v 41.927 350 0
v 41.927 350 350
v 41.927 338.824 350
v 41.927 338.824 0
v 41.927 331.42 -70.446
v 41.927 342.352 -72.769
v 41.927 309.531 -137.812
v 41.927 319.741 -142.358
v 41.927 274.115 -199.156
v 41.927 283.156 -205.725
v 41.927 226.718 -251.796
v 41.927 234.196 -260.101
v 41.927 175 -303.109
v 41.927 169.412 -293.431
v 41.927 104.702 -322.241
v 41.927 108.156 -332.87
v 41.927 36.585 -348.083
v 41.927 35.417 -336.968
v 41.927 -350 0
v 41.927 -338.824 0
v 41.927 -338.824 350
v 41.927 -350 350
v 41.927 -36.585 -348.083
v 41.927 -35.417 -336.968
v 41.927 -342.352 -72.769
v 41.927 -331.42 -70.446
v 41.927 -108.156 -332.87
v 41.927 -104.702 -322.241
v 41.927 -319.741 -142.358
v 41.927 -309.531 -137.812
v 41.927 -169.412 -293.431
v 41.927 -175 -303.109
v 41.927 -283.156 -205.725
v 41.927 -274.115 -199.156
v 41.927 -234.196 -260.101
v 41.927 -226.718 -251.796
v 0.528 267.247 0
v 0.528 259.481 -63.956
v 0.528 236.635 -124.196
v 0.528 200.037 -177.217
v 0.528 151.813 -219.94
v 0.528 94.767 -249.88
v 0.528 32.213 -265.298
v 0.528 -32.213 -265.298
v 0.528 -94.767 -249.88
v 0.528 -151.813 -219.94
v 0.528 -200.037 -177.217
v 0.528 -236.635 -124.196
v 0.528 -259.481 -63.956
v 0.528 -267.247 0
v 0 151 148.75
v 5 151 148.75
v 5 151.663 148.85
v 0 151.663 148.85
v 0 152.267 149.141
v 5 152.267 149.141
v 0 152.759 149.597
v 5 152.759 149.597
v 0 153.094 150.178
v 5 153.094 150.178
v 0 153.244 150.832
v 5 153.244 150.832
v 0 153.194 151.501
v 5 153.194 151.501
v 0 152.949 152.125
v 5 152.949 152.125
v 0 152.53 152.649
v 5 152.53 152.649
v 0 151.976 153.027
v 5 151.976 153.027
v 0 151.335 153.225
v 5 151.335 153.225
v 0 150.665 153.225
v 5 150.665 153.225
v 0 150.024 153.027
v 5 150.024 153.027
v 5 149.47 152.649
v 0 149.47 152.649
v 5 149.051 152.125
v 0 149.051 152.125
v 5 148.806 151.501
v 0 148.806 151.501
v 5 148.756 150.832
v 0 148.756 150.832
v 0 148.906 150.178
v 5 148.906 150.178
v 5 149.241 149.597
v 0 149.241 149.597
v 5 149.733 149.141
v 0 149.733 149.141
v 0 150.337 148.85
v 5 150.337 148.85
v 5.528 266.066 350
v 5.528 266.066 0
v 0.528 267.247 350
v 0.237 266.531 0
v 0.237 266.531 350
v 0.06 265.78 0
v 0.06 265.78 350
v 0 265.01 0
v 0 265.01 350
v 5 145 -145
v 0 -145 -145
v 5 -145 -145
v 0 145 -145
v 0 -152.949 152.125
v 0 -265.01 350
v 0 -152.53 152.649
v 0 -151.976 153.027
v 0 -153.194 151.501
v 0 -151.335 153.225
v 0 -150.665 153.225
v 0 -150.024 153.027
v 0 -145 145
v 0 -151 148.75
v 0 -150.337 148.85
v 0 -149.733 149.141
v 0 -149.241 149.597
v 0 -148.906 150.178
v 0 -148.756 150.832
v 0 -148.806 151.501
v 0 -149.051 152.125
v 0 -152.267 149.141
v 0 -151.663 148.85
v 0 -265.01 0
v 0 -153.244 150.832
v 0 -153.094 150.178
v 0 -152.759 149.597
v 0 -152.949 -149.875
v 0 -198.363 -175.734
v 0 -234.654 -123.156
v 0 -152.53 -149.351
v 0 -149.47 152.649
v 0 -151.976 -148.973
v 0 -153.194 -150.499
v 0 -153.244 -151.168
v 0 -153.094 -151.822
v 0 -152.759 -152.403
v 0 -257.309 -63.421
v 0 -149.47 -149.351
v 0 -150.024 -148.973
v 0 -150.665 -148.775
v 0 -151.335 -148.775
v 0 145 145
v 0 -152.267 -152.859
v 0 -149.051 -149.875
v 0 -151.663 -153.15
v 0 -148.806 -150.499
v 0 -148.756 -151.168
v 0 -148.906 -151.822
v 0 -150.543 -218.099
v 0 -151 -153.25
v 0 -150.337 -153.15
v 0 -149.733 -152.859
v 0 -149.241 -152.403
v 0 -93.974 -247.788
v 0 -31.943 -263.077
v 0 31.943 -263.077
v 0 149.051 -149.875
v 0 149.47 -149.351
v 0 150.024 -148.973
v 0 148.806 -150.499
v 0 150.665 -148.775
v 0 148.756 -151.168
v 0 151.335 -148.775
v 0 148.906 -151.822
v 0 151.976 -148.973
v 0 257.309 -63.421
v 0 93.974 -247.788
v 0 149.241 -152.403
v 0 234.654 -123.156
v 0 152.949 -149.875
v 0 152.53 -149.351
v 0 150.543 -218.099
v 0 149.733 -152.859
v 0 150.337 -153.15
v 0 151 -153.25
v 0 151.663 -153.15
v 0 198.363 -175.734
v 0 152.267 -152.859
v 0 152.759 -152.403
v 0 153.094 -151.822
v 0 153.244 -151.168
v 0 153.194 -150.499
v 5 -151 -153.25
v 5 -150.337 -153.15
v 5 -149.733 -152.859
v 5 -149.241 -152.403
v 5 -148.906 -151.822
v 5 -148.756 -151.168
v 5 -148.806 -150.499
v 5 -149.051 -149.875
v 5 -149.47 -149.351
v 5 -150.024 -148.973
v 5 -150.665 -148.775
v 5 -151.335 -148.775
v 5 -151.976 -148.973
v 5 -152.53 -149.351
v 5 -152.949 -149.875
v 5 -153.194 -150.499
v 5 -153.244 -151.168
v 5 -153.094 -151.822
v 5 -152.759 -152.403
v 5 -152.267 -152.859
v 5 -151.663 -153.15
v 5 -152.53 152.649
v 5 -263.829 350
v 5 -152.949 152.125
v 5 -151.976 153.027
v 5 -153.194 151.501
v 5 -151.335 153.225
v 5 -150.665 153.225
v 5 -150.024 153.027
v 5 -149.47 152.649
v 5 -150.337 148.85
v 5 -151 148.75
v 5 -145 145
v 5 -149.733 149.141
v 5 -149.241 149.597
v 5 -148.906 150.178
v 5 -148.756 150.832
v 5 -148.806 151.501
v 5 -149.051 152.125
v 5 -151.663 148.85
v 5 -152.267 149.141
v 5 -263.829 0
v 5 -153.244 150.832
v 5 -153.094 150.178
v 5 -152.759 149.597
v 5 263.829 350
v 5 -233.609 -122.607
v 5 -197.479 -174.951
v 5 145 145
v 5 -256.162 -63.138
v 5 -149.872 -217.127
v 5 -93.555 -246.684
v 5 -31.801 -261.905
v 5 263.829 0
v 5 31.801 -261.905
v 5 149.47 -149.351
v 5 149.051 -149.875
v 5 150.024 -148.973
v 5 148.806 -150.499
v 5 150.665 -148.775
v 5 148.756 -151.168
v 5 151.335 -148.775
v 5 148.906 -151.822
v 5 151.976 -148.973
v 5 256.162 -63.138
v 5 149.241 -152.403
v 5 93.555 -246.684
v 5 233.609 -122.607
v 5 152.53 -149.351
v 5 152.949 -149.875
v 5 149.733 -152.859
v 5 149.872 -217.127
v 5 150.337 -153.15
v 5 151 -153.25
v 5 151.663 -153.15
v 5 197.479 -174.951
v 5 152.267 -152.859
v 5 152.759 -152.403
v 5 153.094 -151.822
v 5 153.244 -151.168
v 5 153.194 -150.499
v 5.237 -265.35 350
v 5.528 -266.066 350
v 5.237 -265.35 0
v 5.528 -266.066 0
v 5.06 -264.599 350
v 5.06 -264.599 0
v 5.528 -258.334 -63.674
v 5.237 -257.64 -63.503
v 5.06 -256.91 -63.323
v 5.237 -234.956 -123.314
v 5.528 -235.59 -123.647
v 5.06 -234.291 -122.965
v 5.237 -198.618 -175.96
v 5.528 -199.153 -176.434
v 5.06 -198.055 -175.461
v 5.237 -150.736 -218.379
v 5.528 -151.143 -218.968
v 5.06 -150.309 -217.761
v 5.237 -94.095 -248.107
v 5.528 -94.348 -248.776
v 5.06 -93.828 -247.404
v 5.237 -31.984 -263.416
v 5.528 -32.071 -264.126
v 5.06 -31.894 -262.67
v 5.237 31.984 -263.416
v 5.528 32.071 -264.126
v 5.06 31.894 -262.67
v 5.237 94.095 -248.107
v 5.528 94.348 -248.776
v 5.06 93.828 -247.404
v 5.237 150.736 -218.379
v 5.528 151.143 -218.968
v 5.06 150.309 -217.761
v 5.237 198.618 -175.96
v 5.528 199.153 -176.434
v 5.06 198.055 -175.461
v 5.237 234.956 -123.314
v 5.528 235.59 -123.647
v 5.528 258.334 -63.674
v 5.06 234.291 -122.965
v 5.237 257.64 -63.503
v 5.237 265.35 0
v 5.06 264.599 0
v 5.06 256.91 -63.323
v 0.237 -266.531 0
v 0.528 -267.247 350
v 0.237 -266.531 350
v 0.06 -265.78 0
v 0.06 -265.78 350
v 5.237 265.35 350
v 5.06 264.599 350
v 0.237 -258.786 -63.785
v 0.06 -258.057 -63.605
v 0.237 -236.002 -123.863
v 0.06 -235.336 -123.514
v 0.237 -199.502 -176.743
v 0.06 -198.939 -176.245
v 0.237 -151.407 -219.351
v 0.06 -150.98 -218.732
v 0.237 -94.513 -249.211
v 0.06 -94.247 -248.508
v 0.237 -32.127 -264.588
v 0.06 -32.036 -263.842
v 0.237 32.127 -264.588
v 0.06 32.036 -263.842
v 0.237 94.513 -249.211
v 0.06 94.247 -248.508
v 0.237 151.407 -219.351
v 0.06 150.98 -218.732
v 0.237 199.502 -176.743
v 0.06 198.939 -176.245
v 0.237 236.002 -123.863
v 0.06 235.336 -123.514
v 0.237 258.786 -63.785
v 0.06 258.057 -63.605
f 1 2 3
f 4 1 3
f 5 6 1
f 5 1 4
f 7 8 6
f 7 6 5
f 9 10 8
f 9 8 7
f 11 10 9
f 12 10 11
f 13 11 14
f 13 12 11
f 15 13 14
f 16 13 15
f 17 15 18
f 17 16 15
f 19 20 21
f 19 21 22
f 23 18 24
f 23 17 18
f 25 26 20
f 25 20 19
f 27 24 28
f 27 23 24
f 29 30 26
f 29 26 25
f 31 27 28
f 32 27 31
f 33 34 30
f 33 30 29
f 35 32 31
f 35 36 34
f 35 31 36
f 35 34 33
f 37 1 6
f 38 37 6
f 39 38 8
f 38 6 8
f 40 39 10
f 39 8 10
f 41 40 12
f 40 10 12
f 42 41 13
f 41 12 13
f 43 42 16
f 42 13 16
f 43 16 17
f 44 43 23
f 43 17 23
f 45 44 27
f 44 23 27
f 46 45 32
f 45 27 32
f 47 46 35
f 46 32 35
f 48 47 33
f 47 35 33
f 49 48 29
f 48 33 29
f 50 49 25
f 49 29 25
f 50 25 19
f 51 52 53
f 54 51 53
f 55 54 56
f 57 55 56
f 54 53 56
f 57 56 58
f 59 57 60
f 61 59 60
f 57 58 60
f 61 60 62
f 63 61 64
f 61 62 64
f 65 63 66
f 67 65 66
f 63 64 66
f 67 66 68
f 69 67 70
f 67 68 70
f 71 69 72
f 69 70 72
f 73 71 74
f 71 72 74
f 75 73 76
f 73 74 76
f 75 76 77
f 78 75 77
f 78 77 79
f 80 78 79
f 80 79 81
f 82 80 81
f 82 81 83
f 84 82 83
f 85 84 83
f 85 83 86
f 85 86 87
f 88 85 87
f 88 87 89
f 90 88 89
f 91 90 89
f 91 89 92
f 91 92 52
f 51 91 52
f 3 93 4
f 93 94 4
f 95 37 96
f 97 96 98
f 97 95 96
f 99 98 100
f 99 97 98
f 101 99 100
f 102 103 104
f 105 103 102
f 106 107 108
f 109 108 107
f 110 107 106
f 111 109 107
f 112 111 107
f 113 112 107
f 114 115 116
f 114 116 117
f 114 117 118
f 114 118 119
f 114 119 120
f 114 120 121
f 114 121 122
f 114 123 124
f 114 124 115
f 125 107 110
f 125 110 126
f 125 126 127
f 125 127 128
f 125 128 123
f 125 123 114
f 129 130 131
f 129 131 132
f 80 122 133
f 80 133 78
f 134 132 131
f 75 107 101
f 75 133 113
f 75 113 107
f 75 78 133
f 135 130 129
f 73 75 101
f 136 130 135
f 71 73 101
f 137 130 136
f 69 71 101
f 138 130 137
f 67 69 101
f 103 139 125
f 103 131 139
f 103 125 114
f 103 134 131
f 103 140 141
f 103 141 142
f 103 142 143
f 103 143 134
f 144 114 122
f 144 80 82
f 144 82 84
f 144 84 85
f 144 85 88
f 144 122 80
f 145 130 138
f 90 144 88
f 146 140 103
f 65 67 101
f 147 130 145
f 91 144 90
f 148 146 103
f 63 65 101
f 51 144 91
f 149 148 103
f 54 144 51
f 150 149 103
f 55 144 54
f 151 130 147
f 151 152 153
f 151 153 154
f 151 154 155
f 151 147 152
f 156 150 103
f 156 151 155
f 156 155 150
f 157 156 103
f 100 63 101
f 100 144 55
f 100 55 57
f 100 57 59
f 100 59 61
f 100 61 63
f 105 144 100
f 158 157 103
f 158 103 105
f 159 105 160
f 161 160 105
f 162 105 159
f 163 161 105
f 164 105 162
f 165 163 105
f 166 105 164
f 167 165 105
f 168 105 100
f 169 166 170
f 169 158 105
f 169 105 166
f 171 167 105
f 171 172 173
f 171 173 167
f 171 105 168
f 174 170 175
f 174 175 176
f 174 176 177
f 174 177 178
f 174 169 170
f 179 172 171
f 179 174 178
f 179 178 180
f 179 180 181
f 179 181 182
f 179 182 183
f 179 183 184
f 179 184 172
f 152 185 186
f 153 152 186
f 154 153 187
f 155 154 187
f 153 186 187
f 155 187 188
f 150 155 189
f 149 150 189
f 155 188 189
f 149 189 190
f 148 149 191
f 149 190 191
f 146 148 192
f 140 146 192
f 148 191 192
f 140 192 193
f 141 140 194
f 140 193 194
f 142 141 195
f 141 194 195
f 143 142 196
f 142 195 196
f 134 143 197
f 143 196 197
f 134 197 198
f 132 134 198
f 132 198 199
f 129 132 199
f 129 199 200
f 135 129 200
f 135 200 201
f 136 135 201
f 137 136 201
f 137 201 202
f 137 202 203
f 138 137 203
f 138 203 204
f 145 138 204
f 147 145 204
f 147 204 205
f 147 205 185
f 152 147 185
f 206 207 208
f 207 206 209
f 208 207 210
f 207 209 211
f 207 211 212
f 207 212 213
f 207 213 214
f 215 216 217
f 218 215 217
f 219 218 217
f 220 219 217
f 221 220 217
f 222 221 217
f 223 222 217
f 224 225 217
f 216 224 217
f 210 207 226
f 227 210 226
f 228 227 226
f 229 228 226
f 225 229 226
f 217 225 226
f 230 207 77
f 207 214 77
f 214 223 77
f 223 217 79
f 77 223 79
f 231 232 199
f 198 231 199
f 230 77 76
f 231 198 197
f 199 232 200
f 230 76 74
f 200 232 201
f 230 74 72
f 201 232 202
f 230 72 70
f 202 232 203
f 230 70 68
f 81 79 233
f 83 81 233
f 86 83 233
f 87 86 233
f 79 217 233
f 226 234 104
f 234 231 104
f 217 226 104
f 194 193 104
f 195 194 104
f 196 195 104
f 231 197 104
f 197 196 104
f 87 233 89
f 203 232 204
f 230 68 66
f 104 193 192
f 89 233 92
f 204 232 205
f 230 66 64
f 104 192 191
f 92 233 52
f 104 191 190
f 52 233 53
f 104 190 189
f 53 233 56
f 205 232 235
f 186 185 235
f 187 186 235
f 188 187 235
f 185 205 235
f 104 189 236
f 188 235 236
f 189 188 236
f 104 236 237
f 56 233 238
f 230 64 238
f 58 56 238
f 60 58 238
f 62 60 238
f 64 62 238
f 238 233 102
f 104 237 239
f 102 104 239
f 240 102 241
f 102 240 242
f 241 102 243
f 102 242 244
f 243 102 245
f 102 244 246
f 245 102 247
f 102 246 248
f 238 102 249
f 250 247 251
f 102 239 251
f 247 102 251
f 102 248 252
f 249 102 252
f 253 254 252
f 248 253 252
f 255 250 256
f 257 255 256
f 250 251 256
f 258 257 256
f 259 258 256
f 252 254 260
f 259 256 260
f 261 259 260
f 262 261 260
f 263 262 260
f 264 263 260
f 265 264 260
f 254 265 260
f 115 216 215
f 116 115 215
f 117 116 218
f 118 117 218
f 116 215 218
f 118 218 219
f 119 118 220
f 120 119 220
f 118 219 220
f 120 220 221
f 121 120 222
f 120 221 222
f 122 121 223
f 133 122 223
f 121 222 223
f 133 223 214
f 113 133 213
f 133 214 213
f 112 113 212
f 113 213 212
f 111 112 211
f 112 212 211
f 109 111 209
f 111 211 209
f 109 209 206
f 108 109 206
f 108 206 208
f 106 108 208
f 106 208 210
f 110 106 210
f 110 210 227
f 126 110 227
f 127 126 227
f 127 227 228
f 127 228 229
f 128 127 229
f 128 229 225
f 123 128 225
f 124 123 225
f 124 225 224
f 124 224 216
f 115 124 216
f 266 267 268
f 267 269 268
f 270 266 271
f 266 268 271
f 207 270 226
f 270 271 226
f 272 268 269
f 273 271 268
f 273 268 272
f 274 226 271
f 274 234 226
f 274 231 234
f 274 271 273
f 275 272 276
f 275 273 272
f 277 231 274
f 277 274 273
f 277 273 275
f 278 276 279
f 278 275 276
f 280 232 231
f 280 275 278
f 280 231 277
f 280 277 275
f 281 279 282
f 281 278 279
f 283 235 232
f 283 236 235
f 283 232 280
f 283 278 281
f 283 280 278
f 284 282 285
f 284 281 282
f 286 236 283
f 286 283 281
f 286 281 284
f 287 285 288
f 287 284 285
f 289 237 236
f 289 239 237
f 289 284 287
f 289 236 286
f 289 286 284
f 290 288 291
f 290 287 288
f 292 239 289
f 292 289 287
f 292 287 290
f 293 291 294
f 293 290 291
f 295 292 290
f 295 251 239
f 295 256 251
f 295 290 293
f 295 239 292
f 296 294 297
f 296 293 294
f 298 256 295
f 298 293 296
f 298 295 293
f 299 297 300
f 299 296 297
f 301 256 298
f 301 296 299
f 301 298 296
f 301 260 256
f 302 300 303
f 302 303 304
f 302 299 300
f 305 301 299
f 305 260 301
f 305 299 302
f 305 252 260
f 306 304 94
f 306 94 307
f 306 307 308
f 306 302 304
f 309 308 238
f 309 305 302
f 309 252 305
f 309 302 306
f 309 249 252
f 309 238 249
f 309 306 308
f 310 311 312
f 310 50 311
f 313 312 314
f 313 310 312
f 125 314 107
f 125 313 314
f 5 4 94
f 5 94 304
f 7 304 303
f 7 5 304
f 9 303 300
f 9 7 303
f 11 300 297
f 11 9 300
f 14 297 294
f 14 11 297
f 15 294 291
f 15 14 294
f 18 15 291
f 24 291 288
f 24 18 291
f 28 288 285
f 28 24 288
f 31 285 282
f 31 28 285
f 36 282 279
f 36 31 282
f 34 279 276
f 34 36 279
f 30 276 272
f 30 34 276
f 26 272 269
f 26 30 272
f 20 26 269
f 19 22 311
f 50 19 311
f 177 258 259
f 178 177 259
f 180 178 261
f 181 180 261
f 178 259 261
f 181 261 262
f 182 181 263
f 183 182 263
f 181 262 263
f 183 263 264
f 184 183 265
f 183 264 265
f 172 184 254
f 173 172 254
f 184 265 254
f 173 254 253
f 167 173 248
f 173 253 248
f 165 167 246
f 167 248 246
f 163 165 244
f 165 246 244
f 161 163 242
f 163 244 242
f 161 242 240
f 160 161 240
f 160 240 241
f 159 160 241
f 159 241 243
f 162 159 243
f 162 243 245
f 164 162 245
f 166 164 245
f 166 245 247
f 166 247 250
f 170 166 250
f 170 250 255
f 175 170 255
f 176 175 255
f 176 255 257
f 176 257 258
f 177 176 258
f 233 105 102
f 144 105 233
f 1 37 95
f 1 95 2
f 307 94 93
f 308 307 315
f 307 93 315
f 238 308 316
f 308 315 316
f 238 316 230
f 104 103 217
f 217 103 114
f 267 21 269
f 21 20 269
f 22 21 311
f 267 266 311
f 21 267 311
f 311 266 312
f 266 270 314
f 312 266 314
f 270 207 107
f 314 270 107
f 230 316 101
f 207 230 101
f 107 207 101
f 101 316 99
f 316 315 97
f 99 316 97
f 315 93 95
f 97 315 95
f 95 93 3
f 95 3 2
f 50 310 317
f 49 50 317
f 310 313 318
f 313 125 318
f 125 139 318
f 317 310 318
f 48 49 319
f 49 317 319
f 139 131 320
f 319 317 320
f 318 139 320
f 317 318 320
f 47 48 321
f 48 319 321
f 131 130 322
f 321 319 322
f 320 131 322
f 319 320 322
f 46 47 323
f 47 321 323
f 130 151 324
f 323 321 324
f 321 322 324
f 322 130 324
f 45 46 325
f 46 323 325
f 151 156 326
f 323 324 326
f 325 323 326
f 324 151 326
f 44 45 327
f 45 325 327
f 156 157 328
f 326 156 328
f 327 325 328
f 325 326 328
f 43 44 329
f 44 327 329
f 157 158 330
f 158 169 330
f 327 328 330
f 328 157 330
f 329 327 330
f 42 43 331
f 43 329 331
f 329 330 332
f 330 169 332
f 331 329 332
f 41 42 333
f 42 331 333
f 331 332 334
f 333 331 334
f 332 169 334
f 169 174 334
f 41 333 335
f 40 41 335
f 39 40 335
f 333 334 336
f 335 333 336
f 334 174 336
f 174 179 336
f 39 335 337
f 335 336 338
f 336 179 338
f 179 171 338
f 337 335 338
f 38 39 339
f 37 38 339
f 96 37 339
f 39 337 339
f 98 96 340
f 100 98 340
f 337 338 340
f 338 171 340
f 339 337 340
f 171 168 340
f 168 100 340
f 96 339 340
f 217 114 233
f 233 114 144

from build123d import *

# Parameters (mm, degrees)
REVOLVE1_ANGLE           = 180
BOSS_EXTRUDE1_DEPTH      = 350
SHELL2_T                 = -5
SKETCH4_W                = 290
SKETCH4_H                = 290
CUT_EXTRUDE1_DEPTH       = 497.747272869
M4_CLEARANCE_HOLE1_D     = 4.5
M4_CLEARANCE_HOLE1_DEPTH = 30
M4_CLEARANCE_HOLE1_TIP   = 1.351936393
FILLET1_R                = 5


with BuildPart() as part:
    # Esquisse2 → Revolve1 (revolve)
    with BuildSketch(Plane.XY):
        Polygon((41.926758797, 350), (41.926758797, 0), (0, 0), (0, 266.190547052), align=None)
    revolve(axis=Axis((41.926758797, 0, 0), (-1, 0, 0)), revolution_arc=REVOLVE1_ANGLE)

    # Sketch5 → Boss-Extrude1 (add)
    with BuildSketch(Plane.XY):
        Polygon((0, 266.190547052), (41.926758797, 350), (41.926758797, -350), (0, -266.190547052), align=None)
    extrude(amount=BOSS_EXTRUDE1_DEPTH)

    # Shell2
    shell2_openings = [part.faces().sort_by_distance(p)[0] for p in [
        (21.913804754, 0, 350),
        (41.926758797, 0, 32.672450622),
    ]]
    offset(amount=SHELL2_T, openings=shell2_openings, kind=Kind.INTERSECTION)

    # Sketch4 → Cut-Extrude1 (cut, through all)
    with BuildSketch(Plane.ZY):
        Rectangle(SKETCH4_W, SKETCH4_H)
    extrude(amount=-CUT_EXTRUDE1_DEPTH, mode=Mode.SUBTRACT)

    # M4 Clearance Hole1
    with Locations(Plane.ZY):
        with Locations((151, 151), (151, -151), (-151, -151), (-151, 151)):
            Hole(M4_CLEARANCE_HOLE1_D / 2, depth=M4_CLEARANCE_HOLE1_DEPTH)
            with Locations((0, 0, -(M4_CLEARANCE_HOLE1_DEPTH + M4_CLEARANCE_HOLE1_TIP / 2))):  # 118° drill point
                Cone(0, M4_CLEARANCE_HOLE1_D / 2, M4_CLEARANCE_HOLE1_TIP, mode=Mode.SUBTRACT)

    # Fillet1
    fillet1_edges = [part.edges().sort_by_distance(p)[0] for p in [
        (0, 266.190547052, 175),
        (0, -266.190547052, 175),
        (5, 0, -265.009652137),
        (5, 265.009652137, 175),
        (5, -265.009652137, 175),
        (0, 0, -266.190547052),
    ]]
    fillet(fillet1_edges, radius=FILLET1_R)


solid = part.part
